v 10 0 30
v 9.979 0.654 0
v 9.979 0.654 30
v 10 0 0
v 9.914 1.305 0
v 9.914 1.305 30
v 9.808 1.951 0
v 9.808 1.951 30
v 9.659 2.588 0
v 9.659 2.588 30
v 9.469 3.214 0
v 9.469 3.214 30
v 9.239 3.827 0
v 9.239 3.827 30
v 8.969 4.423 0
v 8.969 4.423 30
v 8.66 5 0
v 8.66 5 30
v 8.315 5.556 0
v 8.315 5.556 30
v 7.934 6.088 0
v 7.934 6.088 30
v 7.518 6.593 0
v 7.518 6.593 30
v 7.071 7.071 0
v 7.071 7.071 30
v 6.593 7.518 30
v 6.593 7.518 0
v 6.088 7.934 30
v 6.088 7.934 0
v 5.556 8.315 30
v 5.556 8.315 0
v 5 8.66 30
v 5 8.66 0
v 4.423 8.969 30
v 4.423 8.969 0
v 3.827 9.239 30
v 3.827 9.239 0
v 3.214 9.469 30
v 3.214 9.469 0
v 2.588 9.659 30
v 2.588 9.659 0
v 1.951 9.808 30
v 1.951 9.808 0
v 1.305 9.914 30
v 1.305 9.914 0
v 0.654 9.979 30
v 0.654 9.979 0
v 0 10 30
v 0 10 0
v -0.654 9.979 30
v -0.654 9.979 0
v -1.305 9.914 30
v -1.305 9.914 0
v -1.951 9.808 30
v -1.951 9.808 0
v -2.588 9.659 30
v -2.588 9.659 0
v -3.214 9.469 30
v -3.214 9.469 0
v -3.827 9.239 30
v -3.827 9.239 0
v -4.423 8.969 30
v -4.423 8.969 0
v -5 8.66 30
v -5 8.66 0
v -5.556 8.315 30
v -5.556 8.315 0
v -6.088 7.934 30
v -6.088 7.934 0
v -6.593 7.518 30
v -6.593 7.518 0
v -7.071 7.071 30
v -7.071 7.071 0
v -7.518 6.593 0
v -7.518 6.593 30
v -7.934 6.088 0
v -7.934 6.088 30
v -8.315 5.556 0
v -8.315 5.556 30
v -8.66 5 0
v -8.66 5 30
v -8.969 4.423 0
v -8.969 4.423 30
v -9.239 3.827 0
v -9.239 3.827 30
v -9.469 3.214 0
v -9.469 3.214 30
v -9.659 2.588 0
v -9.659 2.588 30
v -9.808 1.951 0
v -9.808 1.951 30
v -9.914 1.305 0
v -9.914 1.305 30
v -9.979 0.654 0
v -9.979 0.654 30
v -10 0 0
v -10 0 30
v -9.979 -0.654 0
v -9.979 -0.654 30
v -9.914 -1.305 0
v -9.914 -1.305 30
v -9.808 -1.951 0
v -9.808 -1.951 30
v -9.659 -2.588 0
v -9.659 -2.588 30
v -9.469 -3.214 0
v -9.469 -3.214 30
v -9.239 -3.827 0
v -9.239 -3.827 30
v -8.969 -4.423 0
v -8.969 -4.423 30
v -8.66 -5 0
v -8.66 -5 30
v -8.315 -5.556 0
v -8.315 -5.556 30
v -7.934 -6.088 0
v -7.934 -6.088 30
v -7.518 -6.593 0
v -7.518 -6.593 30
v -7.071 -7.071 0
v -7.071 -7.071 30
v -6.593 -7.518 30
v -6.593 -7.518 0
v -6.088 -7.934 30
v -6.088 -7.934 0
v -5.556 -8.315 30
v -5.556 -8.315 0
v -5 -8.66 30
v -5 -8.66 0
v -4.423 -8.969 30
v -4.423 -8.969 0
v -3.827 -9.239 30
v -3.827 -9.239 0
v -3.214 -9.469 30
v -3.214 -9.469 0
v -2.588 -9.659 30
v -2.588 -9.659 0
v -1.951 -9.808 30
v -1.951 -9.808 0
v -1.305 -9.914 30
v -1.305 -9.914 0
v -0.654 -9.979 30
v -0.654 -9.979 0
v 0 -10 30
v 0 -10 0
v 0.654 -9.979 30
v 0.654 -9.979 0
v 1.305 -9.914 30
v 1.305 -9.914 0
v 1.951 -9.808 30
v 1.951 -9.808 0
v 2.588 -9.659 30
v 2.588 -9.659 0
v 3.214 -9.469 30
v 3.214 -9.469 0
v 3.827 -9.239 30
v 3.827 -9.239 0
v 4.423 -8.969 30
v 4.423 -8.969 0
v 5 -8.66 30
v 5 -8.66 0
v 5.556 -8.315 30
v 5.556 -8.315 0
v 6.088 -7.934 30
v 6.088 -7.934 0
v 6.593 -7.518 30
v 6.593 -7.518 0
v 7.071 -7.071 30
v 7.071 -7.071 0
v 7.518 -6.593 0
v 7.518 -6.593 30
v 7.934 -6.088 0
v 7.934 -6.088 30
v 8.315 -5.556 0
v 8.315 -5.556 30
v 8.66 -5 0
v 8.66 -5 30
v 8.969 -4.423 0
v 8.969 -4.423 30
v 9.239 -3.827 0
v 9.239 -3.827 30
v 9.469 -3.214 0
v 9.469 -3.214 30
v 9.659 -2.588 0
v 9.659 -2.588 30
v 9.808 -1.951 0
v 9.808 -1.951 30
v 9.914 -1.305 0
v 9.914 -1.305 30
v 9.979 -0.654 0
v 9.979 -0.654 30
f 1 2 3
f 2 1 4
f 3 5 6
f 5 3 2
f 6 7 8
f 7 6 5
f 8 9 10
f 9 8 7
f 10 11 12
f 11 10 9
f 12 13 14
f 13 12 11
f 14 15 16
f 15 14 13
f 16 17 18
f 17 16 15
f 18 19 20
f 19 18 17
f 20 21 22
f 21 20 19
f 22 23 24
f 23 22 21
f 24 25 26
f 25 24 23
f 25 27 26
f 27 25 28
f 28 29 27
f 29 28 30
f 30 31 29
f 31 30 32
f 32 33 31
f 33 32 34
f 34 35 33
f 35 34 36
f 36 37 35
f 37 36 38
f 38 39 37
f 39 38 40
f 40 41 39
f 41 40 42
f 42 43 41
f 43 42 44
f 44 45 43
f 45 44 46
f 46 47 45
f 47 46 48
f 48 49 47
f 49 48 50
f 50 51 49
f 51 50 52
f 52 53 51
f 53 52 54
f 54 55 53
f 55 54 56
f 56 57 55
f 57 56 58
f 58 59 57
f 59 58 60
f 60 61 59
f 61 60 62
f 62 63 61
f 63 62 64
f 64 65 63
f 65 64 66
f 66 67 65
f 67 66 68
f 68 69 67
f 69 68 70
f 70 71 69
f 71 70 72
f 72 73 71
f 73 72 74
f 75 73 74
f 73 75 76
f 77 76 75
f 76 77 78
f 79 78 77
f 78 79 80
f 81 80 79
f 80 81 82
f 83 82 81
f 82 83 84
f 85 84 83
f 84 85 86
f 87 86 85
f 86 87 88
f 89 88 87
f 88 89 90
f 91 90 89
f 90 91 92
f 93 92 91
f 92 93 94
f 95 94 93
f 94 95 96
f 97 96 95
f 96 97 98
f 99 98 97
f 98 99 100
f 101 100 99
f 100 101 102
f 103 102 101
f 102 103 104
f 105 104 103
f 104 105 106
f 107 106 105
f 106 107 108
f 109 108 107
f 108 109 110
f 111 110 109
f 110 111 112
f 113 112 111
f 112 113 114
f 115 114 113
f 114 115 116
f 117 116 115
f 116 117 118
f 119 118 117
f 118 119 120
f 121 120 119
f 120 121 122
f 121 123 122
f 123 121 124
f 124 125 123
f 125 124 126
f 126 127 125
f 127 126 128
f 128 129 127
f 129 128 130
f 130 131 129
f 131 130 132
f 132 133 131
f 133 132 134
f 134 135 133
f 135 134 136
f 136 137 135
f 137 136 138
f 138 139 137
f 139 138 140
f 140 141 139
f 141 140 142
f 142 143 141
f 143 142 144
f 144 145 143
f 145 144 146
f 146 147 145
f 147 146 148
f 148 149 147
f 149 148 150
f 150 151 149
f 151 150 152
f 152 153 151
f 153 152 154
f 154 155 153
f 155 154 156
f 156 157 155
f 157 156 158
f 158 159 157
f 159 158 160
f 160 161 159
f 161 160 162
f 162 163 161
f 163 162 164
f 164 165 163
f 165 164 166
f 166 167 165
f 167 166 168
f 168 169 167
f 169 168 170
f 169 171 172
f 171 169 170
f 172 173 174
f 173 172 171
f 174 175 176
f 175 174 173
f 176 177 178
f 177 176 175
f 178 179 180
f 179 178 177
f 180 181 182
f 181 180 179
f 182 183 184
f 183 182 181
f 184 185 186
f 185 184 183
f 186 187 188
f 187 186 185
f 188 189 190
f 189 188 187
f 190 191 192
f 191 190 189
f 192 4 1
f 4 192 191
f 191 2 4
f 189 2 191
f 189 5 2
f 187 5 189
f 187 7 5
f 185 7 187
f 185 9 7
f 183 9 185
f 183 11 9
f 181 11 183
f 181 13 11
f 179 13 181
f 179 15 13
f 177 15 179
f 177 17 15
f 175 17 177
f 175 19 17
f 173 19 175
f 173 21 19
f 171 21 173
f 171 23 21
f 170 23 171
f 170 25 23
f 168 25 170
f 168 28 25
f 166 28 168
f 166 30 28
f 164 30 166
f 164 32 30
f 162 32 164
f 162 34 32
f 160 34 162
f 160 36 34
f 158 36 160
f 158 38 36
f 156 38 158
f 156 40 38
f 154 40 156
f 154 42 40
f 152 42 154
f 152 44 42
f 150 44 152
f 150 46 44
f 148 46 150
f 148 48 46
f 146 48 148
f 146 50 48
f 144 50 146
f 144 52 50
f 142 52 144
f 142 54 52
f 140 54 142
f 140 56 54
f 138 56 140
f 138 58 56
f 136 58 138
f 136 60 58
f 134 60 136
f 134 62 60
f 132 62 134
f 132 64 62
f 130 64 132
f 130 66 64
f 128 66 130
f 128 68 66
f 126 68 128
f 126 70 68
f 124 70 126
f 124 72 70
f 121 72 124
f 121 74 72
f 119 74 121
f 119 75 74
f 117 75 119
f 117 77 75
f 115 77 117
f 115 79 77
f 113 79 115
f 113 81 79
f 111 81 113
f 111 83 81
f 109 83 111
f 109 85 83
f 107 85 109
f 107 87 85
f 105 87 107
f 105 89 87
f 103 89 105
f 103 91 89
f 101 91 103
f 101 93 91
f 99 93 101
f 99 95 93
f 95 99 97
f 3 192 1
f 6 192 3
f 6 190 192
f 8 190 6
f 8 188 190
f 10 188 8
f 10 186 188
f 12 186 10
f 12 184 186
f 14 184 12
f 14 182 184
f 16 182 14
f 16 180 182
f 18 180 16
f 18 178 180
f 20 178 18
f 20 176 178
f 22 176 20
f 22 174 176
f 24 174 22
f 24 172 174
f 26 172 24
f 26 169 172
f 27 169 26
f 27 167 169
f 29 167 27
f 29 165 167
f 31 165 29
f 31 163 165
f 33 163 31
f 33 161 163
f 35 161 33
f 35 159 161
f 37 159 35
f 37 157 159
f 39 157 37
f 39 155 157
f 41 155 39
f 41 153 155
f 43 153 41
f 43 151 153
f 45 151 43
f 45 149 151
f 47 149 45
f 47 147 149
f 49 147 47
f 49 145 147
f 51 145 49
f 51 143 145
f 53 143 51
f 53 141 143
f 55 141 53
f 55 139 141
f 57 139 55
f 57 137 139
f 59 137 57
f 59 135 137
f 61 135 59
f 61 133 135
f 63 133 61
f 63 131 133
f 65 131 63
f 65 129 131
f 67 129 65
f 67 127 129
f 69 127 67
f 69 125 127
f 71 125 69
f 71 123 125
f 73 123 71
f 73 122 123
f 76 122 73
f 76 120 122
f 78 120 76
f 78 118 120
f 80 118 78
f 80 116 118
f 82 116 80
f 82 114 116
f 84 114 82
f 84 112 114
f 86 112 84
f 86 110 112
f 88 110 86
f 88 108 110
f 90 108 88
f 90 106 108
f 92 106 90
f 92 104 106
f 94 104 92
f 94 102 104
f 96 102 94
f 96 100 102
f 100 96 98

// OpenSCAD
// Auto-generated from tests/data/feature_fixtures_manifest.json
// fixture: cylinder_plain
// fixture_type: cylinder
// description: Baseline solid cylinder along z-axis. Guards against false classification as plate or box.
$fn = 96;

diameter = 20.000000;
height = 30.000000;

cylinder(h=height, d=diameter, center=false);
